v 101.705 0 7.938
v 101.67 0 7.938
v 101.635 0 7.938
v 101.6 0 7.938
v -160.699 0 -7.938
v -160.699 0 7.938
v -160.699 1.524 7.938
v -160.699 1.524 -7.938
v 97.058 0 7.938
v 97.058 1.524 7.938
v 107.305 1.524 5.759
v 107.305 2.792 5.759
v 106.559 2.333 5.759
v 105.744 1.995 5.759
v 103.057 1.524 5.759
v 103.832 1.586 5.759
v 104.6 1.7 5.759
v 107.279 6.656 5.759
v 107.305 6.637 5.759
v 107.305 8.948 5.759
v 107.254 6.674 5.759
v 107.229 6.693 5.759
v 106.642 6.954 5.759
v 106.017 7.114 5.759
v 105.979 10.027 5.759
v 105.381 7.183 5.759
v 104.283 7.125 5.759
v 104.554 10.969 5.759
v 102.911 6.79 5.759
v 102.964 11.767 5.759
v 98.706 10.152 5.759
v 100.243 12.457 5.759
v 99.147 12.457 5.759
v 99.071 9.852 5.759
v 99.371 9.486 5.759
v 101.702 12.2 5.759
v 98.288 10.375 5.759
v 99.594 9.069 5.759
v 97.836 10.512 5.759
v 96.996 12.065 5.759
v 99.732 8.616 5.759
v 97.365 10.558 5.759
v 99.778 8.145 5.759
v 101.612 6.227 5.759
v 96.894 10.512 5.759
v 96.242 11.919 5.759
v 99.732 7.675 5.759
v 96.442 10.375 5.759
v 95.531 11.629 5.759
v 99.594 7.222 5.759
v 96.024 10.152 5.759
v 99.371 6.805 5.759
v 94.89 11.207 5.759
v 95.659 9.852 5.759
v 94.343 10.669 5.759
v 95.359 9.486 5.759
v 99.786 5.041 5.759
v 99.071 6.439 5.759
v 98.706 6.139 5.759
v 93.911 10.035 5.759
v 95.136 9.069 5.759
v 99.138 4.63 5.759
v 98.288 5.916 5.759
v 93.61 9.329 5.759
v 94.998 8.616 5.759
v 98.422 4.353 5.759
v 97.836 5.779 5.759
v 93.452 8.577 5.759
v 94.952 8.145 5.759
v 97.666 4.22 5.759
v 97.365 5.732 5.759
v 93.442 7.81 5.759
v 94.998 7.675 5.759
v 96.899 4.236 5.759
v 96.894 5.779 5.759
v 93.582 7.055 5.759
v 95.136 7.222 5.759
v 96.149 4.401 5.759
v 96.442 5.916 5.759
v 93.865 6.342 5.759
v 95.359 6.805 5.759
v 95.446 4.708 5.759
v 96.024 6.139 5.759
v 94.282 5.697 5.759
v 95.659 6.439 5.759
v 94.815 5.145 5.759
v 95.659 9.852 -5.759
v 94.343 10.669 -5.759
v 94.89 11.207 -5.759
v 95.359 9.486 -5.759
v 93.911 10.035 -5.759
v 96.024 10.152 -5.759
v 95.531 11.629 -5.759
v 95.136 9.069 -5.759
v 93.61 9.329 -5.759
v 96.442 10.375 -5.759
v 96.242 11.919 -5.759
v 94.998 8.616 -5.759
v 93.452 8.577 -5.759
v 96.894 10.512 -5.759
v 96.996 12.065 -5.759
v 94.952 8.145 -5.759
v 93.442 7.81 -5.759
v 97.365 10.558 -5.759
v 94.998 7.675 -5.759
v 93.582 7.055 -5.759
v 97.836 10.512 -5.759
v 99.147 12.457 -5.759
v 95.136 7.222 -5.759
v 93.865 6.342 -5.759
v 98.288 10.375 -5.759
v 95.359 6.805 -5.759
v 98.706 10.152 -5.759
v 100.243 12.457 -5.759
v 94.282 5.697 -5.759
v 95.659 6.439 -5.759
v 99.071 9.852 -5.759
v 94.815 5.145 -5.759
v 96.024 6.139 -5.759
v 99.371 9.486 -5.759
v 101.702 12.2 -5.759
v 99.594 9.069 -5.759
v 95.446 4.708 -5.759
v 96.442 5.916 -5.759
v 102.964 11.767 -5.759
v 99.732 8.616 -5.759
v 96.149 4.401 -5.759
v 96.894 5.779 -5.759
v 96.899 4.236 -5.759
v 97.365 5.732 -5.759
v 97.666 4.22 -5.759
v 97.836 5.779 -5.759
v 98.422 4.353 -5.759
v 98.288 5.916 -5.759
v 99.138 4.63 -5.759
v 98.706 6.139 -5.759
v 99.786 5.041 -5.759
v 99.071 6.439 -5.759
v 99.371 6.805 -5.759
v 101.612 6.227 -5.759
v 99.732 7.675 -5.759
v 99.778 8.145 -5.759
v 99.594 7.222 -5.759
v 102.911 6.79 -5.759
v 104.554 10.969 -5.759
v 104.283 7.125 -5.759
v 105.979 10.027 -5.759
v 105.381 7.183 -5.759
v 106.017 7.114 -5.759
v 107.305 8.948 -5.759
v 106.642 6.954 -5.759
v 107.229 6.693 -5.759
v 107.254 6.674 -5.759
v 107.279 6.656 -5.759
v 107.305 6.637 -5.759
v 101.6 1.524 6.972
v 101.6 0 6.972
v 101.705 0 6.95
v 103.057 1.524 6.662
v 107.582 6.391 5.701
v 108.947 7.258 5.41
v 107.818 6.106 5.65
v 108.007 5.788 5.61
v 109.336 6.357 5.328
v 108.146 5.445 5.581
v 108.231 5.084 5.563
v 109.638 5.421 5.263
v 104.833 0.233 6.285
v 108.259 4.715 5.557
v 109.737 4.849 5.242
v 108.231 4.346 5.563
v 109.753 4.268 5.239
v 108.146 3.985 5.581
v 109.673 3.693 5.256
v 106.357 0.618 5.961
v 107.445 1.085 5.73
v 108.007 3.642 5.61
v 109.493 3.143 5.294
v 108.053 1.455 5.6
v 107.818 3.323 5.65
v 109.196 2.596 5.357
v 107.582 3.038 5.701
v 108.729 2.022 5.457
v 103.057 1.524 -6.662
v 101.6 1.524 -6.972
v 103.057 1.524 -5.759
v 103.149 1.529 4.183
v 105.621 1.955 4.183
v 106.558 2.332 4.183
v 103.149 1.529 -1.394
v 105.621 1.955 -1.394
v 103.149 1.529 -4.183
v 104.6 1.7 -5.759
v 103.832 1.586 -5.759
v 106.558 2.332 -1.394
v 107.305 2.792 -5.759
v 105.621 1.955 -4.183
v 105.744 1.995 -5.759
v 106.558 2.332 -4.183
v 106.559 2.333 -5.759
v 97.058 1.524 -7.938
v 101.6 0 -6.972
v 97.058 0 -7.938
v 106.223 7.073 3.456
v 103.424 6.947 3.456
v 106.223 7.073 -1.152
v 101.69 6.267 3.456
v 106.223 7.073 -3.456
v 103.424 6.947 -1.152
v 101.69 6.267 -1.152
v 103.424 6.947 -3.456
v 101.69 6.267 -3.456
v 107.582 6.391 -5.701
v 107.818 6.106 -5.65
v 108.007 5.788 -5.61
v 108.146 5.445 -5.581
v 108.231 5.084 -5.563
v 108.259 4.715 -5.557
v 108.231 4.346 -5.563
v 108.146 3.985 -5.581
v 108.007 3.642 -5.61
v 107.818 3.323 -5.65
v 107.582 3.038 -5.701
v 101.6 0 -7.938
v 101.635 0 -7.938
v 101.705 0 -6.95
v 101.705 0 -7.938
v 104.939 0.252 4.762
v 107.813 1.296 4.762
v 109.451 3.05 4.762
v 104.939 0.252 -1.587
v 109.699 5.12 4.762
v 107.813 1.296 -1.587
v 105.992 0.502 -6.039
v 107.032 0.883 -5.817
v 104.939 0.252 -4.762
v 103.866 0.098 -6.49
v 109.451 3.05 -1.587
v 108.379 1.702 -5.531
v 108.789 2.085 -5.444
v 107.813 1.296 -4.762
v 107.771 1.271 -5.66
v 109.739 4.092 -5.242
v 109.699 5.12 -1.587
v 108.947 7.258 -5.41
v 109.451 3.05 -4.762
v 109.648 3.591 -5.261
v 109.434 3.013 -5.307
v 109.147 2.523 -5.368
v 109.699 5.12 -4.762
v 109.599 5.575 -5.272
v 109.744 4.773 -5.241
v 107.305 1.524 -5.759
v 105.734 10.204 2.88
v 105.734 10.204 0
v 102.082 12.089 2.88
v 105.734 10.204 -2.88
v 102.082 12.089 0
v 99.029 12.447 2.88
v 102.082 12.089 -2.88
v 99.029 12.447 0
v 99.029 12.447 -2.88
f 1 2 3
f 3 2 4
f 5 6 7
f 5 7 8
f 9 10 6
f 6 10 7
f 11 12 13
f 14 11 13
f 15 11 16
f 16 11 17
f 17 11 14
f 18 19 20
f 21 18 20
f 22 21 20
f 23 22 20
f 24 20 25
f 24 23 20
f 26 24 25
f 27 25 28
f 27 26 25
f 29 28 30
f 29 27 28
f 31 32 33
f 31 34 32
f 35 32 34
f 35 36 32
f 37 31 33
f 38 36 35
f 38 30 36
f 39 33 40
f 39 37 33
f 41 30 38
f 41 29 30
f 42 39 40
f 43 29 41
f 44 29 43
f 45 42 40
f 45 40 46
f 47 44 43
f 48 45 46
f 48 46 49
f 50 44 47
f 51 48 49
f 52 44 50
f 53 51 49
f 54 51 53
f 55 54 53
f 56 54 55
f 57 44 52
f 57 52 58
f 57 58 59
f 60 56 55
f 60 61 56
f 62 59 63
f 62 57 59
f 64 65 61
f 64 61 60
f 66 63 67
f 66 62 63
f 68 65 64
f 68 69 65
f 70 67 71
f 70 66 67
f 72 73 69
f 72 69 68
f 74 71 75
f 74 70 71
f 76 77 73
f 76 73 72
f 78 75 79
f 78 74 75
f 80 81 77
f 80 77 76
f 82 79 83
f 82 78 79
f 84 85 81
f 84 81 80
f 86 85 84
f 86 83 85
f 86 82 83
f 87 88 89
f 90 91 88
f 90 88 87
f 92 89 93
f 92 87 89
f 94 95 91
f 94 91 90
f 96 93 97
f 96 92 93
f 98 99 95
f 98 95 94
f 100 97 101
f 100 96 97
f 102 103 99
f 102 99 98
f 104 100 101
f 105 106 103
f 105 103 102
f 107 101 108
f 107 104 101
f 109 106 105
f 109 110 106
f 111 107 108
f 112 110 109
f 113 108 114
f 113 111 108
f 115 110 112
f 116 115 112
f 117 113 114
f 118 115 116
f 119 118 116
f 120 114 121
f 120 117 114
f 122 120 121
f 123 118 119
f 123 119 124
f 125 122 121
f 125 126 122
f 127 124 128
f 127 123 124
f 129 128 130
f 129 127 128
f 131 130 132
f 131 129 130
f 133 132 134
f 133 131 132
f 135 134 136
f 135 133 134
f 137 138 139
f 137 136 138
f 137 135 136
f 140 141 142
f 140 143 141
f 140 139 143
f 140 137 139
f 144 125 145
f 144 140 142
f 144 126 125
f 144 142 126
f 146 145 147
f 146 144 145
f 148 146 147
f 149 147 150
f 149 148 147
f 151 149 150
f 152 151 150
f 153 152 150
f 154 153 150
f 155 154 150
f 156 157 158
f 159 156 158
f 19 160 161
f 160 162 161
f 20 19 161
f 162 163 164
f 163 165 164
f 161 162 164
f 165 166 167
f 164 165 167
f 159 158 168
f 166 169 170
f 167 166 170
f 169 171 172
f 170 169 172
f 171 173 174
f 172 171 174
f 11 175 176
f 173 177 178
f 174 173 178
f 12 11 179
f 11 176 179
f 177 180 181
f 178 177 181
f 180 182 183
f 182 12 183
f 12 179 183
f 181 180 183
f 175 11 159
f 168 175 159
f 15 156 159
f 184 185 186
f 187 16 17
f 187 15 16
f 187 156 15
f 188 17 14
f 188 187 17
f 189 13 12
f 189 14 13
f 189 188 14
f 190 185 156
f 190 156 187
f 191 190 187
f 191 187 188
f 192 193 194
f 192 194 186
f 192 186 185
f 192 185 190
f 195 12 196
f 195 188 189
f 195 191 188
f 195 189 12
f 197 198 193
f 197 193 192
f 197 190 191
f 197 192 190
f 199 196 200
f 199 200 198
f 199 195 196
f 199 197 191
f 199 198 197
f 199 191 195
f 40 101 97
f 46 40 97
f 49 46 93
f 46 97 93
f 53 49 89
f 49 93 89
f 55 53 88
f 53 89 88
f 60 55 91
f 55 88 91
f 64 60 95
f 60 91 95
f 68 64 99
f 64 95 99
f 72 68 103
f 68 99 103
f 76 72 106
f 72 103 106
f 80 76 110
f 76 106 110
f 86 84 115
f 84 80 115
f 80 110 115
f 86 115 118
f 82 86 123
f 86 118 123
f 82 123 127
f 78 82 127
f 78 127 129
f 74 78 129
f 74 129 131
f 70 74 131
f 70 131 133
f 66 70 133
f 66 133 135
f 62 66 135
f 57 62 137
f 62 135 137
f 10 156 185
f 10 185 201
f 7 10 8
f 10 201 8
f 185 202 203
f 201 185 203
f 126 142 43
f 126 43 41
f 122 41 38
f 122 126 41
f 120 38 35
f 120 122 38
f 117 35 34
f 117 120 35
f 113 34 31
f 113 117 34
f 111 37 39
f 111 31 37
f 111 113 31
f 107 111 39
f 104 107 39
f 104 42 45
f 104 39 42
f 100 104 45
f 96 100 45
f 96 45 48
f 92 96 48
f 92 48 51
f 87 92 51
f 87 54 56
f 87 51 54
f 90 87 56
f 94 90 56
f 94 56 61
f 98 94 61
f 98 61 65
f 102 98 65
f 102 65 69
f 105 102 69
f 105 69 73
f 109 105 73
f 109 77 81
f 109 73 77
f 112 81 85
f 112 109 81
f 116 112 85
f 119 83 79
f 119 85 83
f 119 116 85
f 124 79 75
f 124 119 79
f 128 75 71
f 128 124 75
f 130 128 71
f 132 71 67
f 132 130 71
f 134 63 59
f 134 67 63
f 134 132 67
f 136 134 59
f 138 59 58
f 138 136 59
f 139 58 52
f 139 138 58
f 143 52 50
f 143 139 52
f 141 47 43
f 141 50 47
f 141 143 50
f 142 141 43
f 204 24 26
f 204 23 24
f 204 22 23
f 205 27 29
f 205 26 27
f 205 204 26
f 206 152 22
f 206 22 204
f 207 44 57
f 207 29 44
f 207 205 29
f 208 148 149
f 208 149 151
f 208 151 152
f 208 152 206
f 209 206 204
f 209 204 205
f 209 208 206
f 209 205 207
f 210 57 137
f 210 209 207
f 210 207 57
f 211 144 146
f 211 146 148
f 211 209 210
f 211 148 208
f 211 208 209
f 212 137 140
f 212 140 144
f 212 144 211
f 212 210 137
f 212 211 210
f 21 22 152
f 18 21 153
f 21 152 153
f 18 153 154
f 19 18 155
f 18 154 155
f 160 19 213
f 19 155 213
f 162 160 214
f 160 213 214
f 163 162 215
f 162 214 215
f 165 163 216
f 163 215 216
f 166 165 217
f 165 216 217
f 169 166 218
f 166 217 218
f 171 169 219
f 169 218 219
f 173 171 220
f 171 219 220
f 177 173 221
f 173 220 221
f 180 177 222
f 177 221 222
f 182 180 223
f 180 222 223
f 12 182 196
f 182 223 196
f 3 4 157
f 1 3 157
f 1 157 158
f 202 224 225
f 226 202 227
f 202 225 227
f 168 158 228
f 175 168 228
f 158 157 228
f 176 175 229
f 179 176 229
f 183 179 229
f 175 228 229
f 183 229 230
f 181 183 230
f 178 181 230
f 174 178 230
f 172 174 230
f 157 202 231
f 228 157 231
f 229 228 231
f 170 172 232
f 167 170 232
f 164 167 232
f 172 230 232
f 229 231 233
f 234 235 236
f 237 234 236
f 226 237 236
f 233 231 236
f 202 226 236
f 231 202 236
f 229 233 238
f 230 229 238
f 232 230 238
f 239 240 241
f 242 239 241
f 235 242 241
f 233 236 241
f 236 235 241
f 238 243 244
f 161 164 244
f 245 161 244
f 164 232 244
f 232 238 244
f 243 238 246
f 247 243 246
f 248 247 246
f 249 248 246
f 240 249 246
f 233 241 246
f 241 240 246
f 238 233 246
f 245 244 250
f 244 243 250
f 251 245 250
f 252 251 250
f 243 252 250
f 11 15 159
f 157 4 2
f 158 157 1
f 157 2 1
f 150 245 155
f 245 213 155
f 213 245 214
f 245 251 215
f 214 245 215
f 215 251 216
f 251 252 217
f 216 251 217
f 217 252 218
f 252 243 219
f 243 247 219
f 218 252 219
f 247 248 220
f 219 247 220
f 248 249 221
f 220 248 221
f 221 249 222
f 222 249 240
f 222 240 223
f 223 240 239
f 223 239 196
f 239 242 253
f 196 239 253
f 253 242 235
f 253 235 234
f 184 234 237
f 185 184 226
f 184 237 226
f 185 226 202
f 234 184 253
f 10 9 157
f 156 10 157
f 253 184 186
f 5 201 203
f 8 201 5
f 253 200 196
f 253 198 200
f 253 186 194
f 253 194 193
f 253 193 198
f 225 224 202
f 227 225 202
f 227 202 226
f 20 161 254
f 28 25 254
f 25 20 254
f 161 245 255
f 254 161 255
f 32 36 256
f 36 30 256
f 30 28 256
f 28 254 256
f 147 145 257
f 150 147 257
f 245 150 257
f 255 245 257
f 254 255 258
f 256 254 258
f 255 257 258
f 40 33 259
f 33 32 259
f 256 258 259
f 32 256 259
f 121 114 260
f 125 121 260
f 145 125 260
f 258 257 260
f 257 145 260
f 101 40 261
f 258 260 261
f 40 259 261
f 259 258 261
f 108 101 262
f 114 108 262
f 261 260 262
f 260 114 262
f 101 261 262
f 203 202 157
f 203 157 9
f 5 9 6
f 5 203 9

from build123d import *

# Parameters (mm, degrees)
BOSS_EXTRUDE1_DEPTH     = 1.524
BOSS_EXTRUDE2_START     = -15.875
BOSS_EXTRUDE2_OUTLINE_R = 2.413
BOSS_EXTRUDE2_DEPTH     = 15.875
CUT_EXTRUDE1_DEPTH      = 162.377710637
CUT_EXTRUDE2_DEPTH      = 162.267022773


# Read off the part's stored shape, not the designer's step: Boss-Extrude2
with BuildPart() as part:
    # Sketch1 → Boss-Extrude1 (new body)
    with BuildSketch(Plane(origin=(0, 0, 0), x_dir=(1, 0, 0), z_dir=(0, 1, 0))):
        Polygon((-101.6, -7.9375), (-160.698602846, -7.9375), (-160.698602846, 7.9375), (-101.6, 7.9375), (101.6, 7.9375), (101.6, -7.9375), align=None)
    extrude(amount=BOSS_EXTRUDE1_DEPTH)

    # Boss-Extrude2 outline → Boss-Extrude2 (add)
    with BuildSketch(Plane.XY.offset(7.9375).offset(BOSS_EXTRUDE2_START)):
        with BuildLine():
            add(Edge.make_bspline(
                [(107.228546138, 6.692607406), (106.366027923, 7.18125968), (105.140033894, 7.42790314), (103.583408394, 7.287922485), (101.756786703, 6.577932625), (99.786331846, 5.041015057)],
                knots=[0, 0, 0, 0, 0, 0, 1, 1, 1, 1, 1, 1], degree=5))
            ThreePointArc((107.228546138, 6.692607406), (108.258782429, 4.761783473), (107.30453503, 2.792296286))
            add(Edge.make_bspline(
                [(101.6, 1.524), (103.258114517, 1.448306251), (104.638933259, 1.583946831), (105.766741539, 1.881154947), (106.652889556, 2.297992507), (107.30453503, 2.792296286)],
                knots=[0, 0, 0, 0, 0, 0, 1, 1, 1, 1, 1, 1], degree=5))
            Line((101.6, 1.524), (101.6, 0))
            add(Edge.make_bspline(
                [(101.6, 0), (104.748480566, -0.003746591), (109.050367624, 0.259943099), (110.73800353, 3.235869603), (109.946934459, 5.044027479), (108.94689031, 7.25796652)],
                knots=[0, 0, 0, 0, 0, 0, 1, 1, 1, 1, 1, 1], degree=5))
            add(Edge.make_bspline(
                [(108.94689031, 7.25796652), (106.455515071, 10.263008134), (101.235622898, 14.016404122), (98.534099755, 12.238404022), (96.99562172, 12.065011937)],
                knots=[0, 0, 0, 0, 0, 1, 1, 1, 1, 1], degree=4))
            ThreePointArc((96.99562172, 12.065011937), (93.706192437, 6.691697876), (99.786331846, 5.041015057))
        make_face()
        with Locations((97.364988112, 8.145377073)):
            Circle(BOSS_EXTRUDE2_OUTLINE_R, mode=Mode.SUBTRACT)
    extrude(amount=BOSS_EXTRUDE2_DEPTH)

    # Sketch6 → Cut-Extrude1 (cut, through all)
    with BuildSketch(Plane.XZ):
        Polygon((109.757786654, 7.9375), (101.6, 7.9375), (101.6, 6.972022749), (109.757786654, 5.238031667), align=None)
        Polygon((109.757786654, -5.238031667), (101.6, -6.972022749), (101.6, -7.9375), (109.757786654, -7.9375), align=None)
        Polygon((101.6, 7.9375), (97.057786654, 7.9375), (101.6, 6.972022749), align=None)
        Polygon((101.6, -7.9375), (101.6, -6.972022749), (97.057786654, -7.9375), align=None)
    extrude(amount=-CUT_EXTRUDE1_DEPTH, mode=Mode.SUBTRACT)

    # Sketch7 → Cut-Extrude2 (cut, through all)
    with BuildSketch(Plane(origin=(0, 1.524, 0), x_dir=(1, 0, 0), z_dir=(0, 1, 0))):
        Polygon((101.6, 5.759486397), (107.30453503, 5.759486397), (107.30453503, 11.866720982), (85.552872932, 11.866720982), (85.552872932, 7.9375), (97.057786654, 7.9375), (101.6, 6.972022749), align=None)
        Polygon((85.552872932, 5.759486397), (101.6, 5.759486397), (101.6, 6.972022749), (97.057786654, 7.9375), (85.552872932, 7.9375), align=None)
        Polygon((101.6, -6.972022749), (101.6, -5.759486397), (85.552872932, -5.759486397), (85.552872932, -7.9375), (97.057786654, -7.9375), align=None)
        Polygon((107.30453503, -7.9375), (107.30453503, -5.759486397), (101.6, -5.759486397), (101.6, -6.972022749), (97.057786654, -7.9375), align=None)
    extrude(amount=CUT_EXTRUDE2_DEPTH, mode=Mode.SUBTRACT)


solid = part.part
